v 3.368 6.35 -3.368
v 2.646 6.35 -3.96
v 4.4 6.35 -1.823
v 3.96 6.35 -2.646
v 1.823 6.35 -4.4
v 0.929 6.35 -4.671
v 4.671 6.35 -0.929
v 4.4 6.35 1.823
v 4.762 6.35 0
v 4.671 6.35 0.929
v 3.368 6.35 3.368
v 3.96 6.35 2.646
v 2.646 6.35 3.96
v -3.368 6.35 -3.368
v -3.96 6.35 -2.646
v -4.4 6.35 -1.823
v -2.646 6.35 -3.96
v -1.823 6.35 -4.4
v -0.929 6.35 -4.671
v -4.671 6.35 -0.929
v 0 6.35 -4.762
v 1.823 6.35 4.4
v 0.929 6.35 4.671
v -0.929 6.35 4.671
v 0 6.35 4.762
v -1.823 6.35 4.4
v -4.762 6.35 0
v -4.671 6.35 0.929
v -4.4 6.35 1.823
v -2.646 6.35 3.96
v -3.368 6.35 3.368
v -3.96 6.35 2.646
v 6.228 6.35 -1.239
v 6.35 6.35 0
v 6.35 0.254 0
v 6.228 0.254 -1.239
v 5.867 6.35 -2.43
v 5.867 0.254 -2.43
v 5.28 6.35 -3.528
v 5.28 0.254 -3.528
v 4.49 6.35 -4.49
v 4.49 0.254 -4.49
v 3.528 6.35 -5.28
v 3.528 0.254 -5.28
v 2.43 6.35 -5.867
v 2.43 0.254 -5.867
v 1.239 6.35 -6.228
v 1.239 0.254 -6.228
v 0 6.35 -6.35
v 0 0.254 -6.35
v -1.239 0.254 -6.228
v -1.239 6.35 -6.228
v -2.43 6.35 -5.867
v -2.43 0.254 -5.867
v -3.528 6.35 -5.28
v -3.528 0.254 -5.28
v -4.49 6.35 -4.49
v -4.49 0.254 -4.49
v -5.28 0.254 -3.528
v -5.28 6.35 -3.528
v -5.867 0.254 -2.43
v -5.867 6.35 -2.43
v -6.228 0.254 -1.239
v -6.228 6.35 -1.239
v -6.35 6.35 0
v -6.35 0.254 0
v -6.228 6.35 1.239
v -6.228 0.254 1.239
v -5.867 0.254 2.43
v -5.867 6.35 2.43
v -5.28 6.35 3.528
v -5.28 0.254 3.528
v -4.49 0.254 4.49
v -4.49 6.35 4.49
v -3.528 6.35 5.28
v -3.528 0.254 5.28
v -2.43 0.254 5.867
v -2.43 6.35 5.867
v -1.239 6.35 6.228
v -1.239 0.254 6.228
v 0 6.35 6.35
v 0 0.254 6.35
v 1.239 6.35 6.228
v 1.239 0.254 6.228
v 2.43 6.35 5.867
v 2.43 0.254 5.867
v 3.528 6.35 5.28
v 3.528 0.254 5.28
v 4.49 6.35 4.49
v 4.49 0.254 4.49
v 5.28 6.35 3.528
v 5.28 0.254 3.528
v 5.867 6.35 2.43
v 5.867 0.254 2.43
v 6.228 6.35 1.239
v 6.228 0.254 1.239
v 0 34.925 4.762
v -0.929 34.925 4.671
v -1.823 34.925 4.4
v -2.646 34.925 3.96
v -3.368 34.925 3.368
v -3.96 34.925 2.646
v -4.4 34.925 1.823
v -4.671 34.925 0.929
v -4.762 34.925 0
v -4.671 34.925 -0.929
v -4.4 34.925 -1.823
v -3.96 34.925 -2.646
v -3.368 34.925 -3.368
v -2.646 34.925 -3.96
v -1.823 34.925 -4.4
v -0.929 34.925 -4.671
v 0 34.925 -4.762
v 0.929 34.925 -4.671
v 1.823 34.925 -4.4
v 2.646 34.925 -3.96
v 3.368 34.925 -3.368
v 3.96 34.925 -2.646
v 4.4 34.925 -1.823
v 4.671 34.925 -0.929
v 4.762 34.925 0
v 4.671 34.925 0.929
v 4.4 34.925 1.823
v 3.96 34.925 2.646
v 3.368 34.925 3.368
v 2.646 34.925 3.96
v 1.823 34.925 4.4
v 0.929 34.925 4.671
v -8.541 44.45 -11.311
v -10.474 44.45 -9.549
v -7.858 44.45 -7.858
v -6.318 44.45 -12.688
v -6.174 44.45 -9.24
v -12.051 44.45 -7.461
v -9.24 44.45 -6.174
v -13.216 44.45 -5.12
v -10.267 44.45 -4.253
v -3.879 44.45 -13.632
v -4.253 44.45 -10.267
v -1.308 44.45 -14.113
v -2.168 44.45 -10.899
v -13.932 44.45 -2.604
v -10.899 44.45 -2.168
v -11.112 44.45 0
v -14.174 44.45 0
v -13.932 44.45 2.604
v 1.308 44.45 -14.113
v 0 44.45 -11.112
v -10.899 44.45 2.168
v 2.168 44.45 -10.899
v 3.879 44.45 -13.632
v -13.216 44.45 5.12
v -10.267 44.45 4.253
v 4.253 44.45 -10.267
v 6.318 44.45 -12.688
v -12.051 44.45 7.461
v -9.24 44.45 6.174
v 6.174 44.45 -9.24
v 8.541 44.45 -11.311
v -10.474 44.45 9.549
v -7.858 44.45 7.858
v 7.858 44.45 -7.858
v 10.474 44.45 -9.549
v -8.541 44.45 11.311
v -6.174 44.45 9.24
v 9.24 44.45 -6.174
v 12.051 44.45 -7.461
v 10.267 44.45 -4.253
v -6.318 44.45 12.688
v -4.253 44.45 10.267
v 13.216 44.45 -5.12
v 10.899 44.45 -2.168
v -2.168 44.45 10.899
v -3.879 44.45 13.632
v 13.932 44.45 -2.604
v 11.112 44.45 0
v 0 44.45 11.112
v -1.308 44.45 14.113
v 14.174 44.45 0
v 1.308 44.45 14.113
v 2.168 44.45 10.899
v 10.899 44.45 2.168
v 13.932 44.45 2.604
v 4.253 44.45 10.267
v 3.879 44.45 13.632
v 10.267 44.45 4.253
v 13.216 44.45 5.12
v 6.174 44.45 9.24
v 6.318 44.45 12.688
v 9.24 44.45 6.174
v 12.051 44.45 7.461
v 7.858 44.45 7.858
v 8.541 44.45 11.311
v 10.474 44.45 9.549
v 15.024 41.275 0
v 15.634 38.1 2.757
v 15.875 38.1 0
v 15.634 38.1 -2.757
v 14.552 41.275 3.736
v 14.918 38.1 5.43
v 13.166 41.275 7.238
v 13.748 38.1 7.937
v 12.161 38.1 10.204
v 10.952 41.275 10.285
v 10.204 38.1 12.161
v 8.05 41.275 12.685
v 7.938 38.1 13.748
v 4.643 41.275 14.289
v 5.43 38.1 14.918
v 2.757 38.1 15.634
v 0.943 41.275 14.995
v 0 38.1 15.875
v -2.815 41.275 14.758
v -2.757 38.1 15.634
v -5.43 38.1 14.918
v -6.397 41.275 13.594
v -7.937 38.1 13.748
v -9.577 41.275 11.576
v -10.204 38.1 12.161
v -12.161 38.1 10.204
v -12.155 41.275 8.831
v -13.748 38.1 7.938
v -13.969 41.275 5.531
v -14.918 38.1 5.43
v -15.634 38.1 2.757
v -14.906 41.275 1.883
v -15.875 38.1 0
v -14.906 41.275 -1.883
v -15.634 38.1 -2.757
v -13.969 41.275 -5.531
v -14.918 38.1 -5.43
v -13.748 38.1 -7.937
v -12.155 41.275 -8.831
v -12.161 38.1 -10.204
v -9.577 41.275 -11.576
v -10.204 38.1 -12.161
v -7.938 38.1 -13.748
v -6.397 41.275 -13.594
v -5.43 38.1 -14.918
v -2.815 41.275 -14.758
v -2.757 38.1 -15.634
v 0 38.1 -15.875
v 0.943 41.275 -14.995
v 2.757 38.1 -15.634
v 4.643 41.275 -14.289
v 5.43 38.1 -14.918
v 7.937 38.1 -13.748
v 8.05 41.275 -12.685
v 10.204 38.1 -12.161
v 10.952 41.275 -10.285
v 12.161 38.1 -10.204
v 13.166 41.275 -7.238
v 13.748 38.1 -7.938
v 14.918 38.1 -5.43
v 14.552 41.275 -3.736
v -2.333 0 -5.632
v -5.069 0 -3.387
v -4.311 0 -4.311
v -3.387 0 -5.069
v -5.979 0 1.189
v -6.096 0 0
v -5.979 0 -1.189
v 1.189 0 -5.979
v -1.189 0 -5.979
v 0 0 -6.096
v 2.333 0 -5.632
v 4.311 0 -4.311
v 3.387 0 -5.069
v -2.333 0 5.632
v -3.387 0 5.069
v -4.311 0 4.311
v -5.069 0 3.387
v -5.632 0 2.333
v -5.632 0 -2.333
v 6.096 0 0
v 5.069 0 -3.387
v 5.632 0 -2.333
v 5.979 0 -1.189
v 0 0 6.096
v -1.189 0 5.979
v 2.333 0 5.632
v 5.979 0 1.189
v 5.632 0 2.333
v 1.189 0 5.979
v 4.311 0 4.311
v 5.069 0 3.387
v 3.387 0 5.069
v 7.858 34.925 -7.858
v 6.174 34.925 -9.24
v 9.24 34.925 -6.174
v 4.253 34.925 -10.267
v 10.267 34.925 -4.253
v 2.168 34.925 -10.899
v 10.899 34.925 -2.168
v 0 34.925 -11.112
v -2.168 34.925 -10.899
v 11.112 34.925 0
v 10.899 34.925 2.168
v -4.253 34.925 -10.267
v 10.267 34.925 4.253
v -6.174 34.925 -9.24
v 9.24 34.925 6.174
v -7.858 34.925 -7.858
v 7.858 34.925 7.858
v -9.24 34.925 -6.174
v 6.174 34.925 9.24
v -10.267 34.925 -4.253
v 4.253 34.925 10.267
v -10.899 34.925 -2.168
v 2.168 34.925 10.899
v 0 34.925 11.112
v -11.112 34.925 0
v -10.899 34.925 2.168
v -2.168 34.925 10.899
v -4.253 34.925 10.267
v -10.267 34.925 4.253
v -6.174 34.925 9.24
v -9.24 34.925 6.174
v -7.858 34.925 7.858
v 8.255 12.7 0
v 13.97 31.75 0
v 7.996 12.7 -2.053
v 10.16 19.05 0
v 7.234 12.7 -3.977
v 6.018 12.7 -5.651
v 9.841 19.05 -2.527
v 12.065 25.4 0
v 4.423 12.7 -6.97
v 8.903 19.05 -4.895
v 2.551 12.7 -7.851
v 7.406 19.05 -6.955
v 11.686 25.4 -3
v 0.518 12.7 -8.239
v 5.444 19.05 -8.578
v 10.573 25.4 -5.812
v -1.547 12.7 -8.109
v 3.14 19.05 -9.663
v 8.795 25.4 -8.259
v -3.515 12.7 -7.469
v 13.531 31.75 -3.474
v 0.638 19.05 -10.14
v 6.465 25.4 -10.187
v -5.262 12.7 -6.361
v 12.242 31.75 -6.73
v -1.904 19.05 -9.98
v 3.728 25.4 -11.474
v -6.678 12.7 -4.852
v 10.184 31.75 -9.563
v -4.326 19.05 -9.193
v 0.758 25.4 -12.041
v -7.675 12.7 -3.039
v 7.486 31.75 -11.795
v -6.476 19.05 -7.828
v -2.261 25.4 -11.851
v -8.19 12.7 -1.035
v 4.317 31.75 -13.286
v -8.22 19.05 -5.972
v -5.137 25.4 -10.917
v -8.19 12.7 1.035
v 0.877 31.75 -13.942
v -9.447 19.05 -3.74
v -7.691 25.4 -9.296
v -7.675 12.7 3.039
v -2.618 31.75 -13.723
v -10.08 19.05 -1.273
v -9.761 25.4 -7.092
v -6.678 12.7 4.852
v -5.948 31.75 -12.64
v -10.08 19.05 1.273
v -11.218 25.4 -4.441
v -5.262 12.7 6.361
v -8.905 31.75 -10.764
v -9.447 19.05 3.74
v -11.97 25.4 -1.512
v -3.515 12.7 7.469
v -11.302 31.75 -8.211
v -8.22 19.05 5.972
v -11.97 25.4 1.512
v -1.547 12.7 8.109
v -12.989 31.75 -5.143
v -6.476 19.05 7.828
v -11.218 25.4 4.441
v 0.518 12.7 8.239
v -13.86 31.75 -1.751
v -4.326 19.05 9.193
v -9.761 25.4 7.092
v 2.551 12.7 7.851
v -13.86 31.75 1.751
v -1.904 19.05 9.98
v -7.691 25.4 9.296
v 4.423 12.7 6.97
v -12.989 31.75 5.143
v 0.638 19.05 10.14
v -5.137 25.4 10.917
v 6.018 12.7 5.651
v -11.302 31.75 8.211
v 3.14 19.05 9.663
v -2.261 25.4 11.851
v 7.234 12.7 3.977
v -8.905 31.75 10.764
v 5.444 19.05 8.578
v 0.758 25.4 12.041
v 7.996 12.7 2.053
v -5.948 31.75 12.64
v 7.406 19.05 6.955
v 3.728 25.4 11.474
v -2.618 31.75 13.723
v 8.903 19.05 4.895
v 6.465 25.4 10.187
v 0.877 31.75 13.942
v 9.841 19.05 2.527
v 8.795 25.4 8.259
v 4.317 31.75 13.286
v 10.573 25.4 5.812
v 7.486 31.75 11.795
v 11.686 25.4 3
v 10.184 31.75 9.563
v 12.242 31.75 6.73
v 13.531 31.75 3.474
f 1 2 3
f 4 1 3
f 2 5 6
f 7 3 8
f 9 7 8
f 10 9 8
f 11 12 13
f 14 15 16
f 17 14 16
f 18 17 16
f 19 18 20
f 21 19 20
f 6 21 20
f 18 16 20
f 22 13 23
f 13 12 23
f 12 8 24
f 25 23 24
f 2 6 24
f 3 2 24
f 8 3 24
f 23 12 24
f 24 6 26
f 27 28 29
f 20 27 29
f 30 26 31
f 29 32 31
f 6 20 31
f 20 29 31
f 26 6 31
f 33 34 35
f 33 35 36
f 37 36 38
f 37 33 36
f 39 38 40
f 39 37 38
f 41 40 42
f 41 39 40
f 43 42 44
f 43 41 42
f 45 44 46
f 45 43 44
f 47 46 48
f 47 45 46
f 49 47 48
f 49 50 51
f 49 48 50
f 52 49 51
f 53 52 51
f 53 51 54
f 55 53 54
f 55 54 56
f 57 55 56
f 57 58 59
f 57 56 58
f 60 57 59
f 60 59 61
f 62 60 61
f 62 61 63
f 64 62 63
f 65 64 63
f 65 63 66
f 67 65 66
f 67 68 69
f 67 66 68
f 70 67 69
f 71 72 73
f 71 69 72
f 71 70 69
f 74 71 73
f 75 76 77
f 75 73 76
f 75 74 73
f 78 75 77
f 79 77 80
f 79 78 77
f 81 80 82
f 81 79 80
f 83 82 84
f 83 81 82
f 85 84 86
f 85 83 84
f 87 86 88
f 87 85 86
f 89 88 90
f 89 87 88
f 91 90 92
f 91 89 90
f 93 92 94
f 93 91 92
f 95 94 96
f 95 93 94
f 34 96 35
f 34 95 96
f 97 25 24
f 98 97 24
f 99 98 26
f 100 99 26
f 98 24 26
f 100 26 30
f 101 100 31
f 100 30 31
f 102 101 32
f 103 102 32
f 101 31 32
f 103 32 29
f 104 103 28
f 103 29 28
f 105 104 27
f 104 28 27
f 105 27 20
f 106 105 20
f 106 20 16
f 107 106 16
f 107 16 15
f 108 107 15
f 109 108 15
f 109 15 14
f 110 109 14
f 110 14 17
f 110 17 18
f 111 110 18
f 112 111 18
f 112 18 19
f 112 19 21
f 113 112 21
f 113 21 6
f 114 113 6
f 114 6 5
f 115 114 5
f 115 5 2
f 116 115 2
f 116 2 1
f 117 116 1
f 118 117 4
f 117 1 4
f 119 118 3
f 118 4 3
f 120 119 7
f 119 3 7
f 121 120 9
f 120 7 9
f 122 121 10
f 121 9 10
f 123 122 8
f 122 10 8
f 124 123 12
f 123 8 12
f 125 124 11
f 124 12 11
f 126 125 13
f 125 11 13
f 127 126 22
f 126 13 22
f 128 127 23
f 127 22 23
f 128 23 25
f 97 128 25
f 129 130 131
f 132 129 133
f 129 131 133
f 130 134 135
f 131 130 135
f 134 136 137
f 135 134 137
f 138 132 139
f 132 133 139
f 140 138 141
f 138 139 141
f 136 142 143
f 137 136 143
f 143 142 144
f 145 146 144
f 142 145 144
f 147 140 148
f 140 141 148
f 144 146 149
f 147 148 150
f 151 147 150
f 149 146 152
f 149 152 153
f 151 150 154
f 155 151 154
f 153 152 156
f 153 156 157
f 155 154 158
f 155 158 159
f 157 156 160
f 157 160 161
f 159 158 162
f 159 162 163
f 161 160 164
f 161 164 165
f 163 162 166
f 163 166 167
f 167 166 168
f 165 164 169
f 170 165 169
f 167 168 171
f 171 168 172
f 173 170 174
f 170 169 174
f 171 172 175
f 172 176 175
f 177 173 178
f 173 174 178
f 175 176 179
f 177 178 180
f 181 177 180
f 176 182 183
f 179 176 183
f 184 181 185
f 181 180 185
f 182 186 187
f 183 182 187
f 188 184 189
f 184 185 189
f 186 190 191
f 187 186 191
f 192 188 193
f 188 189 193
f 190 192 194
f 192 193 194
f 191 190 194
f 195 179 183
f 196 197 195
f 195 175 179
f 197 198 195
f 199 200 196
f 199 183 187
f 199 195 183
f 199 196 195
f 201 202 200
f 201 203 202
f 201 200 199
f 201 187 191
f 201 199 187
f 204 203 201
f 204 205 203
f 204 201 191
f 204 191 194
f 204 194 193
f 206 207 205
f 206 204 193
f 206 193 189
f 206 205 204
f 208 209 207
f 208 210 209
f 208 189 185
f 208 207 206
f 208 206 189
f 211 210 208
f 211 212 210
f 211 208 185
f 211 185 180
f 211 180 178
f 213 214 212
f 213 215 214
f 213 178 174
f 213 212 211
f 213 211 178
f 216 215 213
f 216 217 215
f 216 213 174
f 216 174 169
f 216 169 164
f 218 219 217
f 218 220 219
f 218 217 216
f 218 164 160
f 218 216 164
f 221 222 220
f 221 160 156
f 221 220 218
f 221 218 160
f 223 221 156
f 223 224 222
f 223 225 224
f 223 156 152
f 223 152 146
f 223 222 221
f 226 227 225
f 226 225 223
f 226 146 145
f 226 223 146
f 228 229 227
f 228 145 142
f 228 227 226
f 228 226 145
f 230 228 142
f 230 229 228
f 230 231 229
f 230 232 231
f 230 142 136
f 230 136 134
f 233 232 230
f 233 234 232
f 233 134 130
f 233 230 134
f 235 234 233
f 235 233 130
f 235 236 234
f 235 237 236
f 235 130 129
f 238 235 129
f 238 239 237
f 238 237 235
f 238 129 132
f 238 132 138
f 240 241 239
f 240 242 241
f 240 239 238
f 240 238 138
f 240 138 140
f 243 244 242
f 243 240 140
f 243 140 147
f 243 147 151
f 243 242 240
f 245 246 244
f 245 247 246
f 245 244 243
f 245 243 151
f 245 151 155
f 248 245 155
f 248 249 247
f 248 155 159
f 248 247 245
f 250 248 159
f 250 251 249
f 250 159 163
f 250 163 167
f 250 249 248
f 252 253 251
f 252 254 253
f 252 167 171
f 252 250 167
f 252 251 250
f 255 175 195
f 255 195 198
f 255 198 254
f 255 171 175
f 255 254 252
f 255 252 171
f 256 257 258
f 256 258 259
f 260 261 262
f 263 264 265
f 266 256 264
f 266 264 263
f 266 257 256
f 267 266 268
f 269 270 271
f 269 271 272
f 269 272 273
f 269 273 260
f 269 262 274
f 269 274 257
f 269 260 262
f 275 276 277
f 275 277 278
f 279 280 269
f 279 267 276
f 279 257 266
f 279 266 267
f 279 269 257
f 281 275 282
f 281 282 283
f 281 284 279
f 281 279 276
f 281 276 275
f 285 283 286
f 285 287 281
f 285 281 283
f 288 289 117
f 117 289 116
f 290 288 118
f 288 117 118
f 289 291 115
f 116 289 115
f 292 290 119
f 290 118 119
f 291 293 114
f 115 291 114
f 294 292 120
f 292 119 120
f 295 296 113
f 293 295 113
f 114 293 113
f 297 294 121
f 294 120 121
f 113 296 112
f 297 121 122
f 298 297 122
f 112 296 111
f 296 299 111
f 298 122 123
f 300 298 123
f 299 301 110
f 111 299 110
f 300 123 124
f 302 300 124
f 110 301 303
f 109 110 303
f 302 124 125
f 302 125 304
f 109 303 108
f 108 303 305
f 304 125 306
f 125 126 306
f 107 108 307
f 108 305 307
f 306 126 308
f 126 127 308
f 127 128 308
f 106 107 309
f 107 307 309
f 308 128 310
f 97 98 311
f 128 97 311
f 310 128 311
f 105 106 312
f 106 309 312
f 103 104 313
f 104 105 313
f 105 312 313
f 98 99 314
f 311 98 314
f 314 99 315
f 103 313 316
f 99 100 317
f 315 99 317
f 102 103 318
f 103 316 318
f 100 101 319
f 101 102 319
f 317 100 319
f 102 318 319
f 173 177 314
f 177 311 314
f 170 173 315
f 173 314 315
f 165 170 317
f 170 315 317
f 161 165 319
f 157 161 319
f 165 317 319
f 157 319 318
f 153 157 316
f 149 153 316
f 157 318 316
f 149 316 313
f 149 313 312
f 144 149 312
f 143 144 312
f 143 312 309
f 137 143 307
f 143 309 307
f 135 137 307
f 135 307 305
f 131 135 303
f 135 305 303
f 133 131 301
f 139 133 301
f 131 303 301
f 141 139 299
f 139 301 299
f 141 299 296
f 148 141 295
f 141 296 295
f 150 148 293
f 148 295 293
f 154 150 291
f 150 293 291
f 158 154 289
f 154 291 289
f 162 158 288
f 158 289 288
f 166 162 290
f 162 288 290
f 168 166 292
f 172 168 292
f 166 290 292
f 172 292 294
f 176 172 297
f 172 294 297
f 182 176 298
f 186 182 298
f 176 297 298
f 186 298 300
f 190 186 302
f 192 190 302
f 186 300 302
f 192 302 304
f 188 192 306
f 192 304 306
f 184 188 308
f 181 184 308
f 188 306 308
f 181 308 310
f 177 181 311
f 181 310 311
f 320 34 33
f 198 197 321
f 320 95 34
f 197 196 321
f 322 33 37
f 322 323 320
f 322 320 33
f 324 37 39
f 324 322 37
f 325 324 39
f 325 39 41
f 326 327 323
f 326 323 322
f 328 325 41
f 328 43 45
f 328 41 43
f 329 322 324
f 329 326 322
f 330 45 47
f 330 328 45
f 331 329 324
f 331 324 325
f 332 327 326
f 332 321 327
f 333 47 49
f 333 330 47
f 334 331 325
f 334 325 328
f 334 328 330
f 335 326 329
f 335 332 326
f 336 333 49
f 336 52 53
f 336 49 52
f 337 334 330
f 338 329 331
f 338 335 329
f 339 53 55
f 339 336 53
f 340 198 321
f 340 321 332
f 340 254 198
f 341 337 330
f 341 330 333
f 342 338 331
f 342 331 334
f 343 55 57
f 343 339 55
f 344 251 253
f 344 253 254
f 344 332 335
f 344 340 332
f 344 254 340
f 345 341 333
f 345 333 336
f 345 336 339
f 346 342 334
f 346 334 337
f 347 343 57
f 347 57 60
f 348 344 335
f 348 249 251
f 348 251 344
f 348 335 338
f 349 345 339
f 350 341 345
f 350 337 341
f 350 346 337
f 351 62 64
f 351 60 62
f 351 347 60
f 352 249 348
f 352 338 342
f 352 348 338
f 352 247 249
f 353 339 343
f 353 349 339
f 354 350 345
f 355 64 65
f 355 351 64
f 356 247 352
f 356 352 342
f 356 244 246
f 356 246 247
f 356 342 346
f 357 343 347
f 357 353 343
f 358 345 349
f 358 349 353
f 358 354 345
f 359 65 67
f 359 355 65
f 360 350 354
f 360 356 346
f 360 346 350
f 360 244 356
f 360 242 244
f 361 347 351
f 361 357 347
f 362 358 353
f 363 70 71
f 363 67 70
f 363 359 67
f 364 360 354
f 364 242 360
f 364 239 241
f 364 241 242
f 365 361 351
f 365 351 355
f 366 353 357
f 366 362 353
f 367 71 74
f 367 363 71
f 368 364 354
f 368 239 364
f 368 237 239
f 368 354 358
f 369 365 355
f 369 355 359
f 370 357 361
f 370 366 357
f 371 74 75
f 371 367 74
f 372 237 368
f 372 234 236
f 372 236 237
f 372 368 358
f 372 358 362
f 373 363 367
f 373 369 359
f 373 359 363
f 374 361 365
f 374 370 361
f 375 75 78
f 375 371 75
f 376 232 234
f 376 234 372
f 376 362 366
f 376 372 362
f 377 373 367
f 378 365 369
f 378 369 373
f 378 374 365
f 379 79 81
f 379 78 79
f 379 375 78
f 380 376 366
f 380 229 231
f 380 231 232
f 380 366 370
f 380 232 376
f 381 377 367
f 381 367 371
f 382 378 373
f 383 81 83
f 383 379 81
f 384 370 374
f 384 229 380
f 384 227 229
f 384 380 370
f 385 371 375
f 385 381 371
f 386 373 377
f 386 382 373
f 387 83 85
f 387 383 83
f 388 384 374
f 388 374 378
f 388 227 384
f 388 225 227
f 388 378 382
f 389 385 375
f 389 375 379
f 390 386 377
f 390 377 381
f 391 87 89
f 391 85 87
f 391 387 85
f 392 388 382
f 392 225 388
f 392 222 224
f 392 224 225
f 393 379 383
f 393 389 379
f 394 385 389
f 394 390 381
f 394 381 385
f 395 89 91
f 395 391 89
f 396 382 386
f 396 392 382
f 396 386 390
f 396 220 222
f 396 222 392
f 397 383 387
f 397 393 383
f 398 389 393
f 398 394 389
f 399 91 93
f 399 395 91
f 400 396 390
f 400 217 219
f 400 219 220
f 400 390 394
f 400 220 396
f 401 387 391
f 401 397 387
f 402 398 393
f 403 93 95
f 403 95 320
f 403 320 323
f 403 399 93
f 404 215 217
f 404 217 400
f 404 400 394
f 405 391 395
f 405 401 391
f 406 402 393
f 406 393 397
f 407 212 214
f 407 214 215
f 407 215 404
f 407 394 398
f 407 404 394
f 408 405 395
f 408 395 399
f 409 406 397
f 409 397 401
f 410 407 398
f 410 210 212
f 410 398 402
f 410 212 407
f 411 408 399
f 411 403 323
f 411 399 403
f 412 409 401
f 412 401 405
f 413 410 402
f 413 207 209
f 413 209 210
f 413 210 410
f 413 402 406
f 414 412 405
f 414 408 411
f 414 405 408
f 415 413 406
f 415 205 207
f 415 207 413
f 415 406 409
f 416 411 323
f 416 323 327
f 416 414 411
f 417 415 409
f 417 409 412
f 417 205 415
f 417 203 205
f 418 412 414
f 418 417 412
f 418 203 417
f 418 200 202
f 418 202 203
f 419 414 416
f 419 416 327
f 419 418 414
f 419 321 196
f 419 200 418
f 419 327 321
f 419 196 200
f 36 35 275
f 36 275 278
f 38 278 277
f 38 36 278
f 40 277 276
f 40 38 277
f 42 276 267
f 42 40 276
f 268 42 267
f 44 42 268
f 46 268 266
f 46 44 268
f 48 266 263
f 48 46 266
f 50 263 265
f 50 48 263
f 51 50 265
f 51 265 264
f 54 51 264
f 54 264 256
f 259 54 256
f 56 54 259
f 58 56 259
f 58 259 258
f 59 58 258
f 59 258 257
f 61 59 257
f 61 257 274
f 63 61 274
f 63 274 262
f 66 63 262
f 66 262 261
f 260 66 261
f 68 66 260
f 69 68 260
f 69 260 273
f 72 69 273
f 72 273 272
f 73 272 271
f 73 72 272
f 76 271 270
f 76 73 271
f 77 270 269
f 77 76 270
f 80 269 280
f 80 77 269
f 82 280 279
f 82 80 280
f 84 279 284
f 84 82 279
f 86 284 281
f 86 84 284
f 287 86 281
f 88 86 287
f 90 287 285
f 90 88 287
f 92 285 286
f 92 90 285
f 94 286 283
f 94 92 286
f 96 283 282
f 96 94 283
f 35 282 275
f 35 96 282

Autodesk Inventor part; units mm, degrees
ref_plane "YZ Plane" through (0, 0, 0) normal (1, 0, 0) x (0, 1, 0)
ref_plane "XZ Plane" through (0, 0, 0) normal (0, 1, 0) x (-1, 0, 0)
ref_plane "XY Plane" through (0, 0, 0) normal (0, 0, 1) x (1, 0, 0)
sketch "Stack Sketch" plane through (0, 0, 0) normal (0, 0, 1) x (1, 0, 0)
  line L0 (0, 0) -> (6.35, 0)
  line L1 (6.35, 0) -> (6.35, 6.35)
  line L2 (6.35, 6.35) -> (15.875, 38.1)
  line L3 (0, 44.45) -> (0, 0)
  line L4 (15.875, 38.1) -> (15.875, 46.0795) construction
  line L5 (15.875, 38.1) -> (14.1735, 44.45)
  line L6 (14.1735, 44.45) -> (0, 44.45)
  dimension "d0" = 6.35
  dimension "d1" = 38.1
  dimension "d5" = 6.35
  dimension "d6" = 44.45
  dimension "d7" = 15
  dimension "d17" = 15.875
revolve "Stack Revolve" add sketch "Stack Sketch" angle 360 about axis through (0, 44.45, 0) along (0, -1, 0)
sketch "Stack Hole Sketch" plane through (0, 44.45, 0) normal (0, 1, 0) x (1, 0, 0)
  point P0 (0, 0)
  point P1 (0, 0)
hole "Stack Hole" at (0, 44.45, 0) direction (0, -1, 0) diameter 9.525 depth 38.1 counterbore diameter 22.225 counterbore depth 9.525
chamfer "Bottom Chamfer" distance 0.254 angle 45 1 edges at (-6.35, 0, 0)
properties part number "Caufield_Stack"
